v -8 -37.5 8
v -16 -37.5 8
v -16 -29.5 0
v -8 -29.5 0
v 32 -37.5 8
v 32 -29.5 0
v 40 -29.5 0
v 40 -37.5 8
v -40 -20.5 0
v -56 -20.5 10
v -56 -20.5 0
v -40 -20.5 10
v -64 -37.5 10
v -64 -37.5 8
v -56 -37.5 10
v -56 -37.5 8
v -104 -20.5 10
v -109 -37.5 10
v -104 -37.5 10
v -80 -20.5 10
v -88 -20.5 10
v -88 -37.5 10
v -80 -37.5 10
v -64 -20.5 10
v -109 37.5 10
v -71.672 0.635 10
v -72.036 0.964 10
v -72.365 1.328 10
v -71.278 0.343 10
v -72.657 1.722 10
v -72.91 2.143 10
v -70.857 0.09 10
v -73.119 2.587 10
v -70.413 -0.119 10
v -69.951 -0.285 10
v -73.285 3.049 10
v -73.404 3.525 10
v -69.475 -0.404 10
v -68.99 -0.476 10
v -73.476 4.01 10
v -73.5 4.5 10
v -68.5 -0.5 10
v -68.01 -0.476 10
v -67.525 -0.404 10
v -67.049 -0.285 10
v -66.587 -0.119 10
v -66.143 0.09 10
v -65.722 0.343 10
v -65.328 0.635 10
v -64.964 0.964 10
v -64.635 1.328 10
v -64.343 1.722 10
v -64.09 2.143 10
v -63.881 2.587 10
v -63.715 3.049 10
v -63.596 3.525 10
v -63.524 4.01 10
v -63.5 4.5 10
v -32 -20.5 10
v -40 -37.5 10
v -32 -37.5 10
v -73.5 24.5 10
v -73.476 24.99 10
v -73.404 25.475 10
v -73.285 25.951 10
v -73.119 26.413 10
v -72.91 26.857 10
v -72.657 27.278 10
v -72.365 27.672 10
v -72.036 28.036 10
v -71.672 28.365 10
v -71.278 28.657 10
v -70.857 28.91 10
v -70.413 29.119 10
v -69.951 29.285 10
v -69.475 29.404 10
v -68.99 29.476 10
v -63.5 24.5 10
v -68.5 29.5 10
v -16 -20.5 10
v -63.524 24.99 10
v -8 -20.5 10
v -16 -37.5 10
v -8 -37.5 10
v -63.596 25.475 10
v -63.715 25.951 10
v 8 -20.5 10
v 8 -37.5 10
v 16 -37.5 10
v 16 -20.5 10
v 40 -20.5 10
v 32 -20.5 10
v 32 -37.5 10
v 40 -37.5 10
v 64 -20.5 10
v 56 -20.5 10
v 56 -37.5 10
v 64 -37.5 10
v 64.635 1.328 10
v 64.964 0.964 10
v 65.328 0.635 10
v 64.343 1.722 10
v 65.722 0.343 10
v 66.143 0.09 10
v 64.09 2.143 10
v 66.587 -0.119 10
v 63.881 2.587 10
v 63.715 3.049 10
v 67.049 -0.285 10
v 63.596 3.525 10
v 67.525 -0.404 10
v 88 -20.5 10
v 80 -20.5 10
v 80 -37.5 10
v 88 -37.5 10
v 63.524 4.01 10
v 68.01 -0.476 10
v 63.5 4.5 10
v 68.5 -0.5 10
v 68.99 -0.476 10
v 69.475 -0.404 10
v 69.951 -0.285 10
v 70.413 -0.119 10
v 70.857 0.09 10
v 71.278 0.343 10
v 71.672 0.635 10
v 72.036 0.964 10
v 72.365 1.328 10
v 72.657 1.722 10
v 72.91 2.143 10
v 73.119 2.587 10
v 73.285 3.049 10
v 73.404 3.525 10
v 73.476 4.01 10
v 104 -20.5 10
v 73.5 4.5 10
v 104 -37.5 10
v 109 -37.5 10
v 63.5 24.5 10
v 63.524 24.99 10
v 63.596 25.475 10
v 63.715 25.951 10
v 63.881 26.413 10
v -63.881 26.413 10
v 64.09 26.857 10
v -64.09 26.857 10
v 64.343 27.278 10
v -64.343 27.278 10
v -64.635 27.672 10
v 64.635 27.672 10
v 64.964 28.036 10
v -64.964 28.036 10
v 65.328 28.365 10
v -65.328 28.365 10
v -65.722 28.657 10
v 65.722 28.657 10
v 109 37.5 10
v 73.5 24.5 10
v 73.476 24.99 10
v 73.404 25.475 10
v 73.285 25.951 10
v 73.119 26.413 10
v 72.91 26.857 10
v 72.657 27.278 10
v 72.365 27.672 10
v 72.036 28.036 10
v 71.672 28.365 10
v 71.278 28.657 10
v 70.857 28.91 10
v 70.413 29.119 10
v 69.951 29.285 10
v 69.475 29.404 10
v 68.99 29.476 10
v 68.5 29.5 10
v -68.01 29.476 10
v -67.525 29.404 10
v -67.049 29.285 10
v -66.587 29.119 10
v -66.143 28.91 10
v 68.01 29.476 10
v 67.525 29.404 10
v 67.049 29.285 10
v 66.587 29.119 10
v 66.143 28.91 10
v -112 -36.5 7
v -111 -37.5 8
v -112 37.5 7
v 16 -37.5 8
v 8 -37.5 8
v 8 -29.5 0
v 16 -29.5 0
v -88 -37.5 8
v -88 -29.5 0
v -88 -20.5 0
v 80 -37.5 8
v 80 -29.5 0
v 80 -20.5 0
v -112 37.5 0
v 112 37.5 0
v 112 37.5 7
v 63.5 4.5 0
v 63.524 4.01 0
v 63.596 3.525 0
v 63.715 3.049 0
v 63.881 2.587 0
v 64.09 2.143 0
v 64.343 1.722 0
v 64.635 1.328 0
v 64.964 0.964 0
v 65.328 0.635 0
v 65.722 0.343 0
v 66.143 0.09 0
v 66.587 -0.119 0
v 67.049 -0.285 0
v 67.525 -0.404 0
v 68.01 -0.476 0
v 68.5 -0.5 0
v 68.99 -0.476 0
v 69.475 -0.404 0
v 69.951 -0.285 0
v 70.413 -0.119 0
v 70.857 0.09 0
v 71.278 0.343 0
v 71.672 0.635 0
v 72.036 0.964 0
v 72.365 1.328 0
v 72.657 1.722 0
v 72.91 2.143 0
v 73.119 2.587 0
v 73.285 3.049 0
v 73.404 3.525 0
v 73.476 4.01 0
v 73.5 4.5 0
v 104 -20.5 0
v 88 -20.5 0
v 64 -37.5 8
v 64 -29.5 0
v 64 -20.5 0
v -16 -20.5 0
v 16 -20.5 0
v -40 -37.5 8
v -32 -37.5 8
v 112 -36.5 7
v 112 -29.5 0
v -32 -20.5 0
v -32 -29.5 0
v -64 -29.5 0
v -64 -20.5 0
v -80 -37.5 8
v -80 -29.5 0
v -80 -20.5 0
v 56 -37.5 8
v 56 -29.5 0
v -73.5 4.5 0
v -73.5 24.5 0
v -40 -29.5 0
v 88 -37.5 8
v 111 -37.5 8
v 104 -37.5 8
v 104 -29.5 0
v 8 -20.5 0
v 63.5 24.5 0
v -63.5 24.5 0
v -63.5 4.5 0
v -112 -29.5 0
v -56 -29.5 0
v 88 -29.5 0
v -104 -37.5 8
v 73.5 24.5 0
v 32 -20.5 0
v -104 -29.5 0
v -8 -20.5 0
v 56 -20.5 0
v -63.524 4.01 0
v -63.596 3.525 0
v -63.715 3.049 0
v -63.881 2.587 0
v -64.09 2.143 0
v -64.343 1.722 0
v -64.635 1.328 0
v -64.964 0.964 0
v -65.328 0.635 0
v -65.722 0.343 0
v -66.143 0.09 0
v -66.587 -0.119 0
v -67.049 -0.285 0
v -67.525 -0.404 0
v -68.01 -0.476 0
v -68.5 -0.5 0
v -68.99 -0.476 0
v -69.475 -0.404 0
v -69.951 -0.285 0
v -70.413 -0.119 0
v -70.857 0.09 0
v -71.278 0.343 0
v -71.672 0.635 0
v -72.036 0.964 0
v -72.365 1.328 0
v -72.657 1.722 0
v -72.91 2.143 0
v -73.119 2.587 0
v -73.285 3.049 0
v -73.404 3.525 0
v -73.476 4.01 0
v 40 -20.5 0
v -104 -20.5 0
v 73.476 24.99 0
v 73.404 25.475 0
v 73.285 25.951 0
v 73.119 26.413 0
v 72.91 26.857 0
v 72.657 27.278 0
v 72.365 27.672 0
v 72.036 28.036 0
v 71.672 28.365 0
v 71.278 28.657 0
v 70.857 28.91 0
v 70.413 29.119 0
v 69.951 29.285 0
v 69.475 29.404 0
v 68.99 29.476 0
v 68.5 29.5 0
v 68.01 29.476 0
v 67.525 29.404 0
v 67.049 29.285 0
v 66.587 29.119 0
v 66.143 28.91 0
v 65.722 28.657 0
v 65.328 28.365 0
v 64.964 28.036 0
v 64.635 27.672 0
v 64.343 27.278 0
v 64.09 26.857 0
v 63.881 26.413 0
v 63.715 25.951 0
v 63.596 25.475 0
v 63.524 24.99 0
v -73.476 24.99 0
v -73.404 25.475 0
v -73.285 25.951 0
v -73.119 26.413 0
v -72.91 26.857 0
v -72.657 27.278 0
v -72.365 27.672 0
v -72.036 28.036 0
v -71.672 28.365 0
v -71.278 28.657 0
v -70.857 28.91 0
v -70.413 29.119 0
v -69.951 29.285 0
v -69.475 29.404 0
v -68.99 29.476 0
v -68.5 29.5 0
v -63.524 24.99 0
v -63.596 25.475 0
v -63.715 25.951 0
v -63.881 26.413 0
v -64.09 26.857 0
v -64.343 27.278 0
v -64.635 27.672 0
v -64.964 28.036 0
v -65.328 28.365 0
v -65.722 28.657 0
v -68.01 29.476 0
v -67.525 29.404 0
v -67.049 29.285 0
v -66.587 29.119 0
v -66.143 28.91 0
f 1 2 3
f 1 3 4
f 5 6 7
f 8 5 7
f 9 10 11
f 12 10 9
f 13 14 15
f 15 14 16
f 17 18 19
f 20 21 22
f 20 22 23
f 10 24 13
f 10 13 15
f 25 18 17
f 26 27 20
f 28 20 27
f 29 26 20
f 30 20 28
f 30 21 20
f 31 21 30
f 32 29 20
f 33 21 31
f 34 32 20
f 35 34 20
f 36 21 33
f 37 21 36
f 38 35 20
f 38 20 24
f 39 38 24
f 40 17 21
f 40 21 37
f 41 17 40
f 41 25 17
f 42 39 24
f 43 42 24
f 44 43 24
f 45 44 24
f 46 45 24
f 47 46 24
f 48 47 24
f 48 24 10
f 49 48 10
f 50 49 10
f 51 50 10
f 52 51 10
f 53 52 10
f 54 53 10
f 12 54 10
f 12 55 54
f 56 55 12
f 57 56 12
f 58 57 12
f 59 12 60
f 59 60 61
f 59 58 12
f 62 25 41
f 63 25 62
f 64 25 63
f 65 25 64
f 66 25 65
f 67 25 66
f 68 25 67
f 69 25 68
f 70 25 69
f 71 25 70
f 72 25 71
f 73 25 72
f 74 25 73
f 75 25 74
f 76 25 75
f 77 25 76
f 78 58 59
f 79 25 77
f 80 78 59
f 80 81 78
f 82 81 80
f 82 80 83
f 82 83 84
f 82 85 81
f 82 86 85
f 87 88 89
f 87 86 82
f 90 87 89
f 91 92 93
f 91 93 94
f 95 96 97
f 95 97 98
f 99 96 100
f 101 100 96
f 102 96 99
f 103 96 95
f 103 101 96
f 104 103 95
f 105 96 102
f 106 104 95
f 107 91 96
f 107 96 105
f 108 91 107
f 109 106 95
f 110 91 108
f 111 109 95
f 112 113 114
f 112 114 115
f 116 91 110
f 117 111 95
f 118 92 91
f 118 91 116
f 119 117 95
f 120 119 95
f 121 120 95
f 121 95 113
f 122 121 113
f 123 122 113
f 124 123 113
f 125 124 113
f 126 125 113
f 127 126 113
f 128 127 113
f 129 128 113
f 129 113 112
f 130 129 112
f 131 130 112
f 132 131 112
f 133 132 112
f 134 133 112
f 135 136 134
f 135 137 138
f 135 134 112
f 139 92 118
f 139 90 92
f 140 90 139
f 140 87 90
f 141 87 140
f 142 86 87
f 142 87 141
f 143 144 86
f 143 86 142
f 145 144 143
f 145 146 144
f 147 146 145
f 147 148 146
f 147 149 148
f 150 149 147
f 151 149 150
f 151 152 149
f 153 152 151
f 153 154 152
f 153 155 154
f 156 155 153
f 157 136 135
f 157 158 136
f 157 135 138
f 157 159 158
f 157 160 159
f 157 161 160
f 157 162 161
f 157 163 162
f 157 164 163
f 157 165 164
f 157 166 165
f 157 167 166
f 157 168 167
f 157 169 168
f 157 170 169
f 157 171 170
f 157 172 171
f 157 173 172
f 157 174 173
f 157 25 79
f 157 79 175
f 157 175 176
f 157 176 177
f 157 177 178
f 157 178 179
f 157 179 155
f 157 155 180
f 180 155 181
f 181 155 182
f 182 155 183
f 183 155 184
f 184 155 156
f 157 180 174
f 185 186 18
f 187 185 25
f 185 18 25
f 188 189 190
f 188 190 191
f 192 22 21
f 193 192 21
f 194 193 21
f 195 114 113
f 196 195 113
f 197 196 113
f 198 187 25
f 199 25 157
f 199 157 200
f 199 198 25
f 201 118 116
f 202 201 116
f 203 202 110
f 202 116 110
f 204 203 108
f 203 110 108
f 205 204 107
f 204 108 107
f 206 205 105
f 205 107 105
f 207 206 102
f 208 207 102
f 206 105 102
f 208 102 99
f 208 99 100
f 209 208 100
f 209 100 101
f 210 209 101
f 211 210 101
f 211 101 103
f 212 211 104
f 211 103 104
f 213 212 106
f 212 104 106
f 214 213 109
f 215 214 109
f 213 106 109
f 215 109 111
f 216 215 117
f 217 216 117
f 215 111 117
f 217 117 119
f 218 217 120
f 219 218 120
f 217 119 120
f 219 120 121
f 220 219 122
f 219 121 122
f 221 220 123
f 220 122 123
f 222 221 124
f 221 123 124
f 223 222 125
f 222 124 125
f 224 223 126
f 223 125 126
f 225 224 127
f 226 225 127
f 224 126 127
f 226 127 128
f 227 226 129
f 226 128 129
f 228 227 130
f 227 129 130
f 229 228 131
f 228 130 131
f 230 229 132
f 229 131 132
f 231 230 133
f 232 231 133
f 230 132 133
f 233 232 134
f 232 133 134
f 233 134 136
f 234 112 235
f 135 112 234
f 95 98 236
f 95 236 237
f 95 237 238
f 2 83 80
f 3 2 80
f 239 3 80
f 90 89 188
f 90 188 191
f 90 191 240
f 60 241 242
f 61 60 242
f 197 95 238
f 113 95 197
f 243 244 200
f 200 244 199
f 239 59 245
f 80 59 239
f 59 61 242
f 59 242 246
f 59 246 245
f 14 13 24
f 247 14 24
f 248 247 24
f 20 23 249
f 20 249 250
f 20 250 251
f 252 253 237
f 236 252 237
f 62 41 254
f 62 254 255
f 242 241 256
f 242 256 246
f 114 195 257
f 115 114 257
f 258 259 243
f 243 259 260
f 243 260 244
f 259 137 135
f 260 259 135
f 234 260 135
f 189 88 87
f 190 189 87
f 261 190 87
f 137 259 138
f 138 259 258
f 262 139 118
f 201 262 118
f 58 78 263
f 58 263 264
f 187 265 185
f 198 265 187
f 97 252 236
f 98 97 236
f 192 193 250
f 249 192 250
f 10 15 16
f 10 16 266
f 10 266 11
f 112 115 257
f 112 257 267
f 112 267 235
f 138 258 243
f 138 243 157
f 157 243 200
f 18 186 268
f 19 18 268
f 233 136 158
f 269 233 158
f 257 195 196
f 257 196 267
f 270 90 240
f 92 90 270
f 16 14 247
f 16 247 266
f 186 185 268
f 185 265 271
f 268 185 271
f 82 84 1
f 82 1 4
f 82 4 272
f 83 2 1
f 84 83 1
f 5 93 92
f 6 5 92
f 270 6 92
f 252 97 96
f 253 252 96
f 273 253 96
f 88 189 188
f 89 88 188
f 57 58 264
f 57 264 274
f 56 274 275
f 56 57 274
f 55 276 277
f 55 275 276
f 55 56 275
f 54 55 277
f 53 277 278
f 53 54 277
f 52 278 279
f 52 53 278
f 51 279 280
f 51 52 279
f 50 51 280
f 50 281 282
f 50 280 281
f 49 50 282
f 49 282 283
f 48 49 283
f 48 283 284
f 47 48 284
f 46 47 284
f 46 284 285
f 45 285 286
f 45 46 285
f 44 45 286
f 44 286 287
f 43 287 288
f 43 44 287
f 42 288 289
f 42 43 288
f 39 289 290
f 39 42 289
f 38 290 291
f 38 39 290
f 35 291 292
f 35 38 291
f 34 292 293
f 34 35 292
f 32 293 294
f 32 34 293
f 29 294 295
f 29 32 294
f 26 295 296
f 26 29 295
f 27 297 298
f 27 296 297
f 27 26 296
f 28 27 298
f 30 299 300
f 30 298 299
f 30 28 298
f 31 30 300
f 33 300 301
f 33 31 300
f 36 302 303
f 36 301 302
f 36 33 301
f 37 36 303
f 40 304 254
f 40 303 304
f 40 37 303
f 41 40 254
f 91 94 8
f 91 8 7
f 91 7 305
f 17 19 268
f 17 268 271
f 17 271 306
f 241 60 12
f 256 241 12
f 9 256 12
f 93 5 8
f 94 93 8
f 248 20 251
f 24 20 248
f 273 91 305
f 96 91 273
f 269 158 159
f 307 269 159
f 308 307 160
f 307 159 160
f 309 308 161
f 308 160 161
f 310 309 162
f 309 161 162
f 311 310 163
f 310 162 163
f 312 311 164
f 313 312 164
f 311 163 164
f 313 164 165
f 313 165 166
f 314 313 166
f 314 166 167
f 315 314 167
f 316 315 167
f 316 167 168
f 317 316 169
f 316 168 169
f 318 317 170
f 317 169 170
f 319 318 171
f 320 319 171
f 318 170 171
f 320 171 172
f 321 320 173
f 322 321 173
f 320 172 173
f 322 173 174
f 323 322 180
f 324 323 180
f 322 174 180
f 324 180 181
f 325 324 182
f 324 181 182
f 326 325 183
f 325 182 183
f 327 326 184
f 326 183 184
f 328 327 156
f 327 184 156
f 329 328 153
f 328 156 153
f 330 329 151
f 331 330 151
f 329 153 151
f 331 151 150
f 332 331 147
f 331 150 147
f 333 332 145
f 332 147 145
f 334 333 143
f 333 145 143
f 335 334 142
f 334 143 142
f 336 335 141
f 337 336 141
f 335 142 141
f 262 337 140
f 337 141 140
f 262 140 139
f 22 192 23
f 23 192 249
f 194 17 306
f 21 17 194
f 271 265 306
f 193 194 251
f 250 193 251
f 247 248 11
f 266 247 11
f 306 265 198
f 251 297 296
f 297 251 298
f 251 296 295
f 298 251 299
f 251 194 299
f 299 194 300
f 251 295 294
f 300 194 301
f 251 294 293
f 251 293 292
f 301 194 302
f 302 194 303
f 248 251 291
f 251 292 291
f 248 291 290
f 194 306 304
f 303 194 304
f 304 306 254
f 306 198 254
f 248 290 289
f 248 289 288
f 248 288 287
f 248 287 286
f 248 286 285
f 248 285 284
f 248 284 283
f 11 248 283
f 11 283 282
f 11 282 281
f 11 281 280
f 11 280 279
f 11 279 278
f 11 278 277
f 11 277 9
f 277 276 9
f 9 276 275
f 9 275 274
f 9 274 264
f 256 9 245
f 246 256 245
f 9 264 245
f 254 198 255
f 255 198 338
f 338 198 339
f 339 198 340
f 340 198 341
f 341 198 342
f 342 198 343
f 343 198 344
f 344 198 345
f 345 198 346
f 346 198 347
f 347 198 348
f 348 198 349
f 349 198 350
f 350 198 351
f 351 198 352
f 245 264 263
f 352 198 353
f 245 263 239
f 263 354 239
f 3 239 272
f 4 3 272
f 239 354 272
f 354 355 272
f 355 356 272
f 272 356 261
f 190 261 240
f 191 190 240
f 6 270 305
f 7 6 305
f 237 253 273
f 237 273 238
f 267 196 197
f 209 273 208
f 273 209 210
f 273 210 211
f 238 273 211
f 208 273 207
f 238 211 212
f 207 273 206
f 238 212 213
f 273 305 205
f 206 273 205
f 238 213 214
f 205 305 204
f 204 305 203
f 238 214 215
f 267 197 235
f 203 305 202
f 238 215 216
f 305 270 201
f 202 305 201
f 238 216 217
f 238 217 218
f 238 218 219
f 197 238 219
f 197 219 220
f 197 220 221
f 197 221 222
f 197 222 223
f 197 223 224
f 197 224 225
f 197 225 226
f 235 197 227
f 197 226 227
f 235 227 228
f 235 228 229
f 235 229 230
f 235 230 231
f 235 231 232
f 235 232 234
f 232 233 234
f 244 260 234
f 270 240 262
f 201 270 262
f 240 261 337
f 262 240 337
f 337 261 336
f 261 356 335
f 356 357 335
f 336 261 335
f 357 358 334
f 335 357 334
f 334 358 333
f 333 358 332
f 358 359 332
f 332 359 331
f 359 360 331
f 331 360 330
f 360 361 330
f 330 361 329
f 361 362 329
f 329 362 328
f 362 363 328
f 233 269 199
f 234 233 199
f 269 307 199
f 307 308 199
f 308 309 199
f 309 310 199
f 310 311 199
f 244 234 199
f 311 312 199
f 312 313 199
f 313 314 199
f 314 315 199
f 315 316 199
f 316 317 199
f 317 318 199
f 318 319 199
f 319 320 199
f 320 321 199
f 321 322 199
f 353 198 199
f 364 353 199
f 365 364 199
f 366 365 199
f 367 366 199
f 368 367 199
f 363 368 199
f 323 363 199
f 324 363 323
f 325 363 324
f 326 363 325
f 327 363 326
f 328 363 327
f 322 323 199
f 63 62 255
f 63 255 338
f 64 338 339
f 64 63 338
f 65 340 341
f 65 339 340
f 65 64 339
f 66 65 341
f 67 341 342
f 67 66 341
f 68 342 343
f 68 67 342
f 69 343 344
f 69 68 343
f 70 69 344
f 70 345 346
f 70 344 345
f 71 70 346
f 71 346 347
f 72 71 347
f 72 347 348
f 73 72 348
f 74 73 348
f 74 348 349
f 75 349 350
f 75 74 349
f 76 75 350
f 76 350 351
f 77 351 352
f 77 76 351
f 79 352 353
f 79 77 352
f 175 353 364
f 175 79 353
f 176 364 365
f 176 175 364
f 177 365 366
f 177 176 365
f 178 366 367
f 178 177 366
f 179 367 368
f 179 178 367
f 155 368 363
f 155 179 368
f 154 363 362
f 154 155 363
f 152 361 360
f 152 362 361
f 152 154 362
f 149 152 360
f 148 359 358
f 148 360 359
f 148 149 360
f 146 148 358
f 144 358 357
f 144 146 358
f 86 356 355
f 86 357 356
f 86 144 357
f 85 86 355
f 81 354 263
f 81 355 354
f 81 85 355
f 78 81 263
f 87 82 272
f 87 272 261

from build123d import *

# Parameters (mm, degrees)
SKETCH_1_W             = 224
SKETCH_1_H             = 75
EXTRUDE_1_DEPTH        = 10
CUT_EXTRUDE_1_DEPTH    = 119.533750468
CHAMFER_1_SIZE         = 8
SKETCH_3_W             = 16
SKETCH_3_H             = 17
CUT_EXTRUDE_2_DEPTH    = 119.533750468
CHAMFER_2_SIZE         = 3
PATTERN_LINEAR_1_COUNT = 5
PATTERN_LINEAR_1_PITCH = 24
PATTERN_LINEAR_2_COUNT = 5
PATTERN_LINEAR_2_PITCH = 24


with BuildPart() as part:
    # Эскиз1 → Бобышка-Вытянуть1 (new body)
    with BuildSketch(Plane.XY):
        Rectangle(SKETCH_1_W, SKETCH_1_H)
    extrude(amount=EXTRUDE_1_DEPTH)

    # Эскиз2 → Вырез-Вытянуть1 (cut, symmetric)
    with BuildSketch(Plane.XY.offset(10)):
        with BuildLine():
            Line((-73.5, 4.5), (-73.5, 24.5))
            ThreePointArc((-73.5, 24.5), (-68.5, 29.5), (-63.5, 24.5))
            Line((-63.5, 24.5), (-63.5, 4.5))
            ThreePointArc((-63.5, 4.5), (-68.5, -0.5), (-73.5, 4.5))
        make_face()
    cut_extrude_1 = extrude(amount=CUT_EXTRUDE_1_DEPTH, both=True, mode=Mode.SUBTRACT)

    # Фаска1
    chamfer_1_edges = [part.edges().sort_by_distance(p)[0] for p in [
        (0, -37.5, 0),
    ]]
    chamfer(chamfer_1_edges, length=CHAMFER_1_SIZE)

    # Эскиз3 → Вырез-Вытянуть2 (cut, symmetric)
    with BuildSketch(Plane.XY.offset(10)):
        with Locations((0, -29)):
            Rectangle(SKETCH_3_W, SKETCH_3_H)
    cut_extrude_2 = extrude(amount=CUT_EXTRUDE_2_DEPTH, both=True, mode=Mode.SUBTRACT)

    # Фаска2
    chamfer_2_edges = [part.edges().sort_by_distance(p)[0] for p in [
        (112, 0, 10),
        (-112, 0, 10),
    ]]
    chamfer(chamfer_2_edges, length=CHAMFER_2_SIZE)

    # Линейный массив1: Вырез-Вытянуть2 ×5
    with Locations(*[(-i * PATTERN_LINEAR_1_PITCH, 0, 0) for i in range(1, PATTERN_LINEAR_1_COUNT)]):
        add(cut_extrude_2, mode=Mode.SUBTRACT)

    # Линейный массив2: Вырез-Вытянуть2 ×5
    with Locations(*[(i * PATTERN_LINEAR_2_PITCH, 0, 0) for i in range(1, PATTERN_LINEAR_2_COUNT)]):
        add(cut_extrude_2, mode=Mode.SUBTRACT)

    # Зеркальное отражение2: Вырез-Вытянуть1 across plane
    add(cut_extrude_1.mirror(Plane(origin=(0, 0, 0), x_dir=(0, 0, 1), z_dir=(1, 0, 0))), mode=Mode.SUBTRACT)


solid = part.part
